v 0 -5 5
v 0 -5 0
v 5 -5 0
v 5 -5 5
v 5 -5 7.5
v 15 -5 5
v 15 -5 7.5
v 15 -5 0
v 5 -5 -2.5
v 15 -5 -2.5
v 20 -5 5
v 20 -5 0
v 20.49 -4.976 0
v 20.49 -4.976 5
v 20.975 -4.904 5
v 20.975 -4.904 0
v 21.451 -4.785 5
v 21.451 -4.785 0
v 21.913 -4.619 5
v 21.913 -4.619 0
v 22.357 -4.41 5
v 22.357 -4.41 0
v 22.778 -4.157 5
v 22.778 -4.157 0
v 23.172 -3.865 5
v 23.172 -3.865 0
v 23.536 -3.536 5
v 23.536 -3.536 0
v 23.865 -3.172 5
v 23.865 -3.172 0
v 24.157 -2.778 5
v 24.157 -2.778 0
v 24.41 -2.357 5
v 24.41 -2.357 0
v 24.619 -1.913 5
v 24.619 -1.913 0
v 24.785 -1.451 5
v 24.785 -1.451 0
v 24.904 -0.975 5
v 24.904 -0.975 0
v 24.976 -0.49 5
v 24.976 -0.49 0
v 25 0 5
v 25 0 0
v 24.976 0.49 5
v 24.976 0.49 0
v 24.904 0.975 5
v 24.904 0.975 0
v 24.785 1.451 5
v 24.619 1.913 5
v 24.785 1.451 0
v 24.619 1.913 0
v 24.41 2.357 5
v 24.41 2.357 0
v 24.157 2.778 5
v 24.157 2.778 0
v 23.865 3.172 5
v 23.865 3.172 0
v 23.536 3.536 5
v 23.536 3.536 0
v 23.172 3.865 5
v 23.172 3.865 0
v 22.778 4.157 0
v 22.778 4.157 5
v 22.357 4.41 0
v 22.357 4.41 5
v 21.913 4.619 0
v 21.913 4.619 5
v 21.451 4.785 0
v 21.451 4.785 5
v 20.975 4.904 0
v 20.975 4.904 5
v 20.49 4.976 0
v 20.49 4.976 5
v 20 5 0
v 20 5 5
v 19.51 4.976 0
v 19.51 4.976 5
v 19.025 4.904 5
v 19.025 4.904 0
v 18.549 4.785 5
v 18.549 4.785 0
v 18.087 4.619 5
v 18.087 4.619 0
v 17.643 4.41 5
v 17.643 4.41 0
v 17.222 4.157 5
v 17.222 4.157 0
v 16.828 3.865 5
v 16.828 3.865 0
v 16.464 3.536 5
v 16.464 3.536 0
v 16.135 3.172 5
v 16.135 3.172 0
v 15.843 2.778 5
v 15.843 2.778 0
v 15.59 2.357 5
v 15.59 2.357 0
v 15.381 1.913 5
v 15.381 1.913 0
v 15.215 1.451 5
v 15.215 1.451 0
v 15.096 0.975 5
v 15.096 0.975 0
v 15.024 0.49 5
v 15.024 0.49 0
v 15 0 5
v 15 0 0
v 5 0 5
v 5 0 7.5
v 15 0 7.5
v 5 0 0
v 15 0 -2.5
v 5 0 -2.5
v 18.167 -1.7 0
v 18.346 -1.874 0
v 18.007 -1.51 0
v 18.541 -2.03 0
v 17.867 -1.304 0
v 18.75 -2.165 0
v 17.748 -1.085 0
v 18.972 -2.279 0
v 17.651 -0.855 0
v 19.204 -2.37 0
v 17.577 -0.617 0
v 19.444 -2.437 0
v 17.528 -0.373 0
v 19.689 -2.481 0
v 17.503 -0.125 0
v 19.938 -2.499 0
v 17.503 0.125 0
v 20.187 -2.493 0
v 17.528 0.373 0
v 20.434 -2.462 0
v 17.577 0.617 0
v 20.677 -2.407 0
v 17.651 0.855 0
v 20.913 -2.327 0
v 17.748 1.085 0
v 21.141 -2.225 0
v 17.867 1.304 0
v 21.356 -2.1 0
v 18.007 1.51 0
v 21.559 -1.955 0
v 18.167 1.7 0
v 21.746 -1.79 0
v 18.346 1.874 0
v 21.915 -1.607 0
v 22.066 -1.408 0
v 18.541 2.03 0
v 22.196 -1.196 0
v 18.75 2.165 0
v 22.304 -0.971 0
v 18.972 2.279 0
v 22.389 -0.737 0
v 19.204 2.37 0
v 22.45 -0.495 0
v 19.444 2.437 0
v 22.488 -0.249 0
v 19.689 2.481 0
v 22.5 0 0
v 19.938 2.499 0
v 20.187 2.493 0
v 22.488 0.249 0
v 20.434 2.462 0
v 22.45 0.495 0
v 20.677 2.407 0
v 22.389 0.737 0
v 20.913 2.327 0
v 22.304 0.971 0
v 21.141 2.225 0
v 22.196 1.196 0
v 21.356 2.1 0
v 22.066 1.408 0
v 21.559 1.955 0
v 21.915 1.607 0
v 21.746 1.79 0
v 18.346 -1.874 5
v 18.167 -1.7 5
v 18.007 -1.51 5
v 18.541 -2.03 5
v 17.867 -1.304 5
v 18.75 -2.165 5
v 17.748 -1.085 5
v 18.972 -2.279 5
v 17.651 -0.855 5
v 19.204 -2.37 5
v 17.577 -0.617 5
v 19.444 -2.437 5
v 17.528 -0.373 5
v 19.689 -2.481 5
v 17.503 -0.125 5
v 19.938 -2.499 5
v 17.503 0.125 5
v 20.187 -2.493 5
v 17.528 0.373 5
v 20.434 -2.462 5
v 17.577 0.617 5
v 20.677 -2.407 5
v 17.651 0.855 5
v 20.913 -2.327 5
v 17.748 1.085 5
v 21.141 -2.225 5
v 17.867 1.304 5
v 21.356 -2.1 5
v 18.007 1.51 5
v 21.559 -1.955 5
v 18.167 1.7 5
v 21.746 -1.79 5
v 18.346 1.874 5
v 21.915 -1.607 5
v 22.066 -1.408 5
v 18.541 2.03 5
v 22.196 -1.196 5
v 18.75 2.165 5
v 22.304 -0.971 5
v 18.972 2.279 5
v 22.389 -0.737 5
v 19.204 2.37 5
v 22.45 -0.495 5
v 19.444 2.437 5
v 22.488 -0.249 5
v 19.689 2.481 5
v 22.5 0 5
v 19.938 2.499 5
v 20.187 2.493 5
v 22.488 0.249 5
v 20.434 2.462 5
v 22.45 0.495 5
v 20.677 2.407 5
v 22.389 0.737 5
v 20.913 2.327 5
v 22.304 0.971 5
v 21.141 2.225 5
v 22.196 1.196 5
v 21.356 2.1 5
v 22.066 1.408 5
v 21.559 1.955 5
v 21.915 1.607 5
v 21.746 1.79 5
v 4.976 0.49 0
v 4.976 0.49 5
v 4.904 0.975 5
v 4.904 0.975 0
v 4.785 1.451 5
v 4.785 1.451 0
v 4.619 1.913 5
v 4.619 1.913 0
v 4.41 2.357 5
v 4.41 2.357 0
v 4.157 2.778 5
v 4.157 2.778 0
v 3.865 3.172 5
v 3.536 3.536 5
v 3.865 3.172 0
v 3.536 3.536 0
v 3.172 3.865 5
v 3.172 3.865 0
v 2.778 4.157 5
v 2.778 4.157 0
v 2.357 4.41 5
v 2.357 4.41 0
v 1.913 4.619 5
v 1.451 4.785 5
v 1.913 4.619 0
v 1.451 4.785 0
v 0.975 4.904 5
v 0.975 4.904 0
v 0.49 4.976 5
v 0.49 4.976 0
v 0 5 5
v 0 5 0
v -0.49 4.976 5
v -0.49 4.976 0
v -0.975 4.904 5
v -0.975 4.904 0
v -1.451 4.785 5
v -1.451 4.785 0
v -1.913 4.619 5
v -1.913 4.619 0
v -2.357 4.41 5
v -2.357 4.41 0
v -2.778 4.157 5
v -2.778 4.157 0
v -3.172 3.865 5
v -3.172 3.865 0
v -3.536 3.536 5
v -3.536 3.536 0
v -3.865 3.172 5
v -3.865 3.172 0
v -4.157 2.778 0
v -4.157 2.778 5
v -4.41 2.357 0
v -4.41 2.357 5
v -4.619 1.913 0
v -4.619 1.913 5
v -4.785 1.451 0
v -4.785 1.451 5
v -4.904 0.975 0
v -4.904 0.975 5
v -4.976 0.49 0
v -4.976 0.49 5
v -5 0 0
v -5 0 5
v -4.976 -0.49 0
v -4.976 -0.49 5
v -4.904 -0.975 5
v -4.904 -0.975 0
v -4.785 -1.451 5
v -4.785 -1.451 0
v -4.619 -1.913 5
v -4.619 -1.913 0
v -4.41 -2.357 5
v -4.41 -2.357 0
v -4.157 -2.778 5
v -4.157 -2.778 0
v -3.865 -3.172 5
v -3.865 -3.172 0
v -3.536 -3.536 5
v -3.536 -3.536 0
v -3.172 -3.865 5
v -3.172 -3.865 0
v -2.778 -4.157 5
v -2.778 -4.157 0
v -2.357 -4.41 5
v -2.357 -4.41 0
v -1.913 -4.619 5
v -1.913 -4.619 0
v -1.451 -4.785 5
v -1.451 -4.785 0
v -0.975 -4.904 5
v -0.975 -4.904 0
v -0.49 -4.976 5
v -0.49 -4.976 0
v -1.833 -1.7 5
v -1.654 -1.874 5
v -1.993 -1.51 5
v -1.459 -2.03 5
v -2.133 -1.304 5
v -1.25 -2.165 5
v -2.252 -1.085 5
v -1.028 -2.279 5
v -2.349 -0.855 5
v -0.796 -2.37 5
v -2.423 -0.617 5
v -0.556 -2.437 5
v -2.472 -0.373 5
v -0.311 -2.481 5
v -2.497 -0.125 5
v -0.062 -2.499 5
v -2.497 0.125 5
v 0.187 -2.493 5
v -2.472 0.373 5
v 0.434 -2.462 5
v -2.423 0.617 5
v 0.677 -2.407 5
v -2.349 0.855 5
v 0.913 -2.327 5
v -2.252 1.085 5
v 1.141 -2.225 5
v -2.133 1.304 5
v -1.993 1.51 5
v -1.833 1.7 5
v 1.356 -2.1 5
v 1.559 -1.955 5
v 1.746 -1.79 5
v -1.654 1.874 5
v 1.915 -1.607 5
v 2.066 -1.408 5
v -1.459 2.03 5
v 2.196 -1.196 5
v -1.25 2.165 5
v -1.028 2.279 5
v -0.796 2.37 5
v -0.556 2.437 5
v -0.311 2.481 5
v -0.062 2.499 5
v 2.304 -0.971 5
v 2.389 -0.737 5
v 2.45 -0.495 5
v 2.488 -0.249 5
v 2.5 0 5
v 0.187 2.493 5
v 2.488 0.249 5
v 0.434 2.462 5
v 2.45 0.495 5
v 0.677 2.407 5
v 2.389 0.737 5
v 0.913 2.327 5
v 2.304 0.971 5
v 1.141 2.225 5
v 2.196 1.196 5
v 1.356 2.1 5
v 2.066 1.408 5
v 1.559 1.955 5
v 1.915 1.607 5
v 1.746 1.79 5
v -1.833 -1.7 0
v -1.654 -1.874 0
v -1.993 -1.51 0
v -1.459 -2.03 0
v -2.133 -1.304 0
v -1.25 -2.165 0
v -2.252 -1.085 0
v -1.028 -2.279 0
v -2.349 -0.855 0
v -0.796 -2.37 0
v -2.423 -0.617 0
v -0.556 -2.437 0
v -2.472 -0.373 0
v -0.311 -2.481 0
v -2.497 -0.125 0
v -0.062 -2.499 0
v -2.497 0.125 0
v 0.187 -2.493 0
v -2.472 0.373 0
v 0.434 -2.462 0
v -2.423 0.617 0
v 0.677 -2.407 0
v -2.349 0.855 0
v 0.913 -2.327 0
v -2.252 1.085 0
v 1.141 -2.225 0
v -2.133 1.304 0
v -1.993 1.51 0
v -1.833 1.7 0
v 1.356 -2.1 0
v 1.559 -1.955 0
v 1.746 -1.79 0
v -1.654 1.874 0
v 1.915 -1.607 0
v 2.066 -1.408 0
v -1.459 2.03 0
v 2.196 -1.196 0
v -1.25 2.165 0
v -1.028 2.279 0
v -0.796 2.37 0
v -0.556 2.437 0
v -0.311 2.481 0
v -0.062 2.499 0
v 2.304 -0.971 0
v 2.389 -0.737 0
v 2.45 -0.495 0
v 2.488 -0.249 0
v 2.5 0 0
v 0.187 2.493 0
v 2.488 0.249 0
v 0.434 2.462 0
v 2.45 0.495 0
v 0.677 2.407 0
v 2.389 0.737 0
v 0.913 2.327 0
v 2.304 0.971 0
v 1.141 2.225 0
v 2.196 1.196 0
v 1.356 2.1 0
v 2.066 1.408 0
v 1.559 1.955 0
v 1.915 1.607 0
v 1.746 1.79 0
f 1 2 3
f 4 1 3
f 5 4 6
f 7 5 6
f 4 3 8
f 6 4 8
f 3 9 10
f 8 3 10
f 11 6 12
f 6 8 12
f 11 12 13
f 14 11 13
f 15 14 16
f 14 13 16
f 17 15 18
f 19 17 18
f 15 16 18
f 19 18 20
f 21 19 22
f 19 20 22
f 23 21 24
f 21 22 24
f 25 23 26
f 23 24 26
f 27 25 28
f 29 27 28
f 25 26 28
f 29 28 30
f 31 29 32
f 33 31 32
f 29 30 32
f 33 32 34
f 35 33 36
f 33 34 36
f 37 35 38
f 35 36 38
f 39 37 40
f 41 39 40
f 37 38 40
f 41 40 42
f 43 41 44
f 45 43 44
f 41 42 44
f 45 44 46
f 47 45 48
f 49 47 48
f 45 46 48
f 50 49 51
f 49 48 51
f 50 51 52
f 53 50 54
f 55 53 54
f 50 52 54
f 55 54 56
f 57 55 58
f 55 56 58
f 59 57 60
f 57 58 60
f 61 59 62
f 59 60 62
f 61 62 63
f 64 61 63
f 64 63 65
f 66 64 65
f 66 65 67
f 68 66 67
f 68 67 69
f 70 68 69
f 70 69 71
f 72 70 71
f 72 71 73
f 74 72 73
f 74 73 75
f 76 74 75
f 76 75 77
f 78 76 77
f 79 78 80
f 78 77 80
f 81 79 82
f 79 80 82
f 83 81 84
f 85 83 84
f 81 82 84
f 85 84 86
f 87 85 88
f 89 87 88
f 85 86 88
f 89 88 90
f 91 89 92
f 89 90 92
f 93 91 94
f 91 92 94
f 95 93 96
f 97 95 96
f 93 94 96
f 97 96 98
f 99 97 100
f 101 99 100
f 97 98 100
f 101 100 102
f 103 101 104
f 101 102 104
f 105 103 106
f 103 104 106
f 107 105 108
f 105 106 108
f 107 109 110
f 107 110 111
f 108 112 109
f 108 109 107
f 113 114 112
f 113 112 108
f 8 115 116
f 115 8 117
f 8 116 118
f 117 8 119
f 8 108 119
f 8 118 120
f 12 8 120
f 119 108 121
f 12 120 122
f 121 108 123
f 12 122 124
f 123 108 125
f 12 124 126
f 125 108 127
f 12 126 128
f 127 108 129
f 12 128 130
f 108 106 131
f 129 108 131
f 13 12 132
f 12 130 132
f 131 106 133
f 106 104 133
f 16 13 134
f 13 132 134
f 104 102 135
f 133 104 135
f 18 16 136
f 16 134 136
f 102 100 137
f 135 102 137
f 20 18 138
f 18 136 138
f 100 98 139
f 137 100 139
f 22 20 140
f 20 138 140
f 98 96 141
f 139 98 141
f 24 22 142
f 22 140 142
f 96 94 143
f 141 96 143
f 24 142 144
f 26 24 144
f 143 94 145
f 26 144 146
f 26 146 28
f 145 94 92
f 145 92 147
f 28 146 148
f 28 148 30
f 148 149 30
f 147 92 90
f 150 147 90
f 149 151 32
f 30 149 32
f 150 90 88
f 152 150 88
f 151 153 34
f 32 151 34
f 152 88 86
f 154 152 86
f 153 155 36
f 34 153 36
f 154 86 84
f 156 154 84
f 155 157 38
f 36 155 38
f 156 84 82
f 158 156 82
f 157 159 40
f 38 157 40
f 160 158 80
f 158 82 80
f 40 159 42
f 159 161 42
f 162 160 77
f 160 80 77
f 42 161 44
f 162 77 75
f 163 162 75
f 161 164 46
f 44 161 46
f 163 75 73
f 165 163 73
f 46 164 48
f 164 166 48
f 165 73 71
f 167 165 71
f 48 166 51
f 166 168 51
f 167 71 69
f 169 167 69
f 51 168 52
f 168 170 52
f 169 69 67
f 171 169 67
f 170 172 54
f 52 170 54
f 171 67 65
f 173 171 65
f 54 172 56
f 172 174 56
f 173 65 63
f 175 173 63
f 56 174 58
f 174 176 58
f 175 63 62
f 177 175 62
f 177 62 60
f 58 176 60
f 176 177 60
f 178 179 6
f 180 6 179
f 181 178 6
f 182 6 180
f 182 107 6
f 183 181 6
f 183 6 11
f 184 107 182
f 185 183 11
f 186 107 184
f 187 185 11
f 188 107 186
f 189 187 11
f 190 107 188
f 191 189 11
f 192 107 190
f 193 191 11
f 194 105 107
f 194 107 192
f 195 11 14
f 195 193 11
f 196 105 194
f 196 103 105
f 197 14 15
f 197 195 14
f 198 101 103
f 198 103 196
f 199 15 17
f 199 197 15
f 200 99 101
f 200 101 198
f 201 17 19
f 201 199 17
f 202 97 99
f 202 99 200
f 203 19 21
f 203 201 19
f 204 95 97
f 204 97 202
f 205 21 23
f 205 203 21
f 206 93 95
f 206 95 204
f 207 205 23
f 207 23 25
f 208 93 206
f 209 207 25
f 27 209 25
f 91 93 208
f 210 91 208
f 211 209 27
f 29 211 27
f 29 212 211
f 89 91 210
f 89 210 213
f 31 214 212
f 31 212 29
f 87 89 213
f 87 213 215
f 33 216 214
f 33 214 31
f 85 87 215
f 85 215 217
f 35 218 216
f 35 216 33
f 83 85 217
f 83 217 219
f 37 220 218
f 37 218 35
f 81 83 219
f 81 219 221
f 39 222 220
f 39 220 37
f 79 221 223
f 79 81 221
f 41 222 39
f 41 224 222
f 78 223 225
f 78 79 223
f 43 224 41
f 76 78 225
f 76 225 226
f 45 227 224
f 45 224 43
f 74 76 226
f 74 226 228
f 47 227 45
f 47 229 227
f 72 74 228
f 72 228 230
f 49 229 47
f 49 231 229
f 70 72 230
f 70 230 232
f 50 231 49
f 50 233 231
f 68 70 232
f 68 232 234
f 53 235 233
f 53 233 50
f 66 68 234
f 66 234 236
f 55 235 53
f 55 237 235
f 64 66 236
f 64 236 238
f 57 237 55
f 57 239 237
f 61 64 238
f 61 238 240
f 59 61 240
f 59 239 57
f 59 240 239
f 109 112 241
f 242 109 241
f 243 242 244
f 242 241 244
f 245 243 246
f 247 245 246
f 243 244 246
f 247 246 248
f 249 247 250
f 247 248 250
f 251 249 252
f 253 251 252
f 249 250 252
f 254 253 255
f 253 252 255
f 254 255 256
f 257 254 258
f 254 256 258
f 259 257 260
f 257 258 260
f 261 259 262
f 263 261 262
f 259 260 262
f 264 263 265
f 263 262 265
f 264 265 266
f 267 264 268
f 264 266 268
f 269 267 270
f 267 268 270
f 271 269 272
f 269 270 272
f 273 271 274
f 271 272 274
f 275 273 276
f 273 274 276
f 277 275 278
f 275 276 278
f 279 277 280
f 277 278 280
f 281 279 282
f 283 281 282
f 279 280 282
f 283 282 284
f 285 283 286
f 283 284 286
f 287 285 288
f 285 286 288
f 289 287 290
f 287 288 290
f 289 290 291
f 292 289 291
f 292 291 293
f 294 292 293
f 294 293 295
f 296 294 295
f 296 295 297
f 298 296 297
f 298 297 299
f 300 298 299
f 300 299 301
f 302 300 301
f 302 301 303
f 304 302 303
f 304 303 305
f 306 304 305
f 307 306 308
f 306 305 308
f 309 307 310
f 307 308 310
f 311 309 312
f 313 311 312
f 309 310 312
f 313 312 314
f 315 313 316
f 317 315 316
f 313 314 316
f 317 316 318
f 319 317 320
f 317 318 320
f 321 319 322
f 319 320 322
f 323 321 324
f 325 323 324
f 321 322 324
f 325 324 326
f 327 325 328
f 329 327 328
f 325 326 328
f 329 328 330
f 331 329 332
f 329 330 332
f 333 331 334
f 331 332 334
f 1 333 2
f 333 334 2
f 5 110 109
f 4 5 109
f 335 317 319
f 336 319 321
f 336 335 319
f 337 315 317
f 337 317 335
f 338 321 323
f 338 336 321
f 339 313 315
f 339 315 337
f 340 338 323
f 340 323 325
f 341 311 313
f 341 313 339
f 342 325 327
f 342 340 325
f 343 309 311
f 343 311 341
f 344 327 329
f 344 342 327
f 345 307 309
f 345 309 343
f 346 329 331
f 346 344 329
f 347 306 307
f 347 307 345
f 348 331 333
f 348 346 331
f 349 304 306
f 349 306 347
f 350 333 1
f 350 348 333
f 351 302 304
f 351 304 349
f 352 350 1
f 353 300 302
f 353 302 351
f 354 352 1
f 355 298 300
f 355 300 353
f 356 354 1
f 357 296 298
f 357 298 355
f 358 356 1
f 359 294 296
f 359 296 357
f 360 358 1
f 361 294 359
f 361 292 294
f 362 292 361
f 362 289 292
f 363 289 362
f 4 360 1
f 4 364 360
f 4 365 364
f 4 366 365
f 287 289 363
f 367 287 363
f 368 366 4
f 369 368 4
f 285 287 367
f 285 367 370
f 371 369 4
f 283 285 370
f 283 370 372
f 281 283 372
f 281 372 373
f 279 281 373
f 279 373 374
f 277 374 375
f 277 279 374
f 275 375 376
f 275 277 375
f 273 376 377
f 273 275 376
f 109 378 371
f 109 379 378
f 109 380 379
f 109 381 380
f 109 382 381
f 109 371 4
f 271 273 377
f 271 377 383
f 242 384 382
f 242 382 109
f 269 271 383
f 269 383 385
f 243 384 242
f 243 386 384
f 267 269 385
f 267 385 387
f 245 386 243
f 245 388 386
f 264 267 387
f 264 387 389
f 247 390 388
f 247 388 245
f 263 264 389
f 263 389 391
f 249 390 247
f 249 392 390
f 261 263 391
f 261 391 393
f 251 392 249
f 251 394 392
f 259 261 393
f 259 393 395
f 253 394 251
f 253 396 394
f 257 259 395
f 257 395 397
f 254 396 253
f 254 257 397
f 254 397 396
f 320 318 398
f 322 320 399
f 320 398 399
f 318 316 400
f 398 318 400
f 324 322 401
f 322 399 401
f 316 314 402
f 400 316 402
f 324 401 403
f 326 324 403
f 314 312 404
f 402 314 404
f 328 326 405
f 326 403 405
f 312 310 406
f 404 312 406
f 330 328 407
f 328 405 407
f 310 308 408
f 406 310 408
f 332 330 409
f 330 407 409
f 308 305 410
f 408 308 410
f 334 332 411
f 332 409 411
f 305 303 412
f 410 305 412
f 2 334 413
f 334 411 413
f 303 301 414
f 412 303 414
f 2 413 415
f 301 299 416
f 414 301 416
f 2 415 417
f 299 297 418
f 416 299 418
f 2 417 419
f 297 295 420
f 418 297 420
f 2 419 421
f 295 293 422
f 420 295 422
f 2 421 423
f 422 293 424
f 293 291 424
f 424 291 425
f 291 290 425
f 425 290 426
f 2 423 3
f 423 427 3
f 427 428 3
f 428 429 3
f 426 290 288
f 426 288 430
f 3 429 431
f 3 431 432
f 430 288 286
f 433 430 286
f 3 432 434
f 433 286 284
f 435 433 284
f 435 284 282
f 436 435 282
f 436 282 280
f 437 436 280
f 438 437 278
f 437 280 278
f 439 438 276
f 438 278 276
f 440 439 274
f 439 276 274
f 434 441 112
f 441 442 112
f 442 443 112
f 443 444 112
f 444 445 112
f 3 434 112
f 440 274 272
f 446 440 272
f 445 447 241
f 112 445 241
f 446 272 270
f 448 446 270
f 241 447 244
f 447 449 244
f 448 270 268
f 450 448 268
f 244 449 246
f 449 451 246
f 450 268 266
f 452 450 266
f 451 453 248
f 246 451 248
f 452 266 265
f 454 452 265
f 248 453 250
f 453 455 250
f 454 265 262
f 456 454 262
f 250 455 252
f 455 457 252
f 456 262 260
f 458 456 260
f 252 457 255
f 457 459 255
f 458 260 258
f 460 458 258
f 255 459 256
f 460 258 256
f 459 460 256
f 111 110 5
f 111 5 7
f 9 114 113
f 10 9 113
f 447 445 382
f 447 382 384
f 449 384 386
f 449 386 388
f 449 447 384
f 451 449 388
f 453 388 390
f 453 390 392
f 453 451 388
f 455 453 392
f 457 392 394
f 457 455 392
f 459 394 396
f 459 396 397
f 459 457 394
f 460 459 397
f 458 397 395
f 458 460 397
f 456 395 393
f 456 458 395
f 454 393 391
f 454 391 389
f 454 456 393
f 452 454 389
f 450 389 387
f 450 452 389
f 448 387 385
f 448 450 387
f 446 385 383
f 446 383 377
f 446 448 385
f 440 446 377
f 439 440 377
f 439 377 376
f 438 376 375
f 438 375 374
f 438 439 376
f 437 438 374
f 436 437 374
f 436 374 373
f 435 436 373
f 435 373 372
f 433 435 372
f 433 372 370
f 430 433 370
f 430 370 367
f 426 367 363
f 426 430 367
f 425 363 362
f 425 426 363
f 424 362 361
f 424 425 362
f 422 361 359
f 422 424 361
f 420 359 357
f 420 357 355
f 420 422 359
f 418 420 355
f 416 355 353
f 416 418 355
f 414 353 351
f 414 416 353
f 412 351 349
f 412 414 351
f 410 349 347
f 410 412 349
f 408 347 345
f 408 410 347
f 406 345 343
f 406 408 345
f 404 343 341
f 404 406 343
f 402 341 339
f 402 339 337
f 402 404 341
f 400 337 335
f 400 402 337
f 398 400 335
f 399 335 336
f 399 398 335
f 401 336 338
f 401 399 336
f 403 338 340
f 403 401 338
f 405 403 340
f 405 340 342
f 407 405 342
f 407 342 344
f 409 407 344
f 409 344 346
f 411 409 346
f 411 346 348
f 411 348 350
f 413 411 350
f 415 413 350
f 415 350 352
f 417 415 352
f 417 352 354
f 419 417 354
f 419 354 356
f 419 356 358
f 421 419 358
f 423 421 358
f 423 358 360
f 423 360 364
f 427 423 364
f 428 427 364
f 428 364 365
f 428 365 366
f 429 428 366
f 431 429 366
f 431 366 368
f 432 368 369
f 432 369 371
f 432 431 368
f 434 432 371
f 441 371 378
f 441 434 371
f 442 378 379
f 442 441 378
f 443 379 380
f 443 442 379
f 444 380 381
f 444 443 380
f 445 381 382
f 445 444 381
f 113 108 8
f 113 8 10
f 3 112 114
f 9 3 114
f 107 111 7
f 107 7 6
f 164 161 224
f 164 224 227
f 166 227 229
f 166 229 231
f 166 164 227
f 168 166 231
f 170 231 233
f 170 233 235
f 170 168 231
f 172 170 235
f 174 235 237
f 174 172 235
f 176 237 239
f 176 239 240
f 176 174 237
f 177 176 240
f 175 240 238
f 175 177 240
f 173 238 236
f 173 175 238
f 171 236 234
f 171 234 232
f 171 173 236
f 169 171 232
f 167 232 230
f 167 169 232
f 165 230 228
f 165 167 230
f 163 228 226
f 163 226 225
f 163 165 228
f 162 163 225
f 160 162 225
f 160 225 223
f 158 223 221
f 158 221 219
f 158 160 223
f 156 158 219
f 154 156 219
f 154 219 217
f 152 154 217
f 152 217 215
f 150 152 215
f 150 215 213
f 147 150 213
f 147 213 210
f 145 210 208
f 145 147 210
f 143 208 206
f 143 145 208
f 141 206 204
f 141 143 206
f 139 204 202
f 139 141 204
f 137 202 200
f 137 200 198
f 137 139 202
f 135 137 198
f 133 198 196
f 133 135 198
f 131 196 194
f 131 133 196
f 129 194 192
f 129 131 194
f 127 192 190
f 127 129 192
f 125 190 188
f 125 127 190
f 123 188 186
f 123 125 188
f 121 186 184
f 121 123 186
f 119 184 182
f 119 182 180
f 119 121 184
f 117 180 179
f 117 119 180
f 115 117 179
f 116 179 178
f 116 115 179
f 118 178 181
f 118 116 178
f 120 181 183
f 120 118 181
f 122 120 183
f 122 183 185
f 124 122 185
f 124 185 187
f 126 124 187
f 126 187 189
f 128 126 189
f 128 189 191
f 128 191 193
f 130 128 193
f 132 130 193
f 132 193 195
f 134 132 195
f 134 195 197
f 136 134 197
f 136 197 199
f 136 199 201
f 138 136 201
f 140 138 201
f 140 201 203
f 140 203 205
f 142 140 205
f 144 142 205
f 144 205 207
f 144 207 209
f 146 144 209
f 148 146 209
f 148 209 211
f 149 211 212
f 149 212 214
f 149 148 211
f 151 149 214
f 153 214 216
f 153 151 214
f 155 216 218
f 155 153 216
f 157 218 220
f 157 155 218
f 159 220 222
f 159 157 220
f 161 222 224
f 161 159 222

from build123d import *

# Parameters (mm, degrees)
SKETCH1_R           = 2.5
BOSS_EXTRUDE1_DEPTH = 5
SKETCH2_W           = 10
SKETCH2_H           = 10
BOSS_EXTRUDE2_DEPTH = 5


with BuildPart() as part:
    # Sketch1 → Boss-Extrude1 (new body)
    with BuildSketch(Plane.XY):
        with BuildLine():
            ThreePointArc((5, 0), (-3.535533906, 3.535533906), (0, -5))
            Line((0, -5), (20, -5))
            ThreePointArc((20, -5), (23.535533906, 3.535533906), (15, 0))
            Line((15, 0), (5, 0))
        make_face()
        with Locations((20, 0)):
            Circle(SKETCH1_R, mode=Mode.SUBTRACT)
        Circle(SKETCH1_R, mode=Mode.SUBTRACT)
    extrude(amount=BOSS_EXTRUDE1_DEPTH)

    # Sketch2 → Boss-Extrude2 (add)
    with BuildSketch(Plane(origin=(0, 0, 0), x_dir=(1, 0, 0), z_dir=(0, 1, 0))):
        with Locations((10, -2.5)):
            Rectangle(SKETCH2_W, SKETCH2_H)
    extrude(amount=-BOSS_EXTRUDE2_DEPTH)


solid = part.part
